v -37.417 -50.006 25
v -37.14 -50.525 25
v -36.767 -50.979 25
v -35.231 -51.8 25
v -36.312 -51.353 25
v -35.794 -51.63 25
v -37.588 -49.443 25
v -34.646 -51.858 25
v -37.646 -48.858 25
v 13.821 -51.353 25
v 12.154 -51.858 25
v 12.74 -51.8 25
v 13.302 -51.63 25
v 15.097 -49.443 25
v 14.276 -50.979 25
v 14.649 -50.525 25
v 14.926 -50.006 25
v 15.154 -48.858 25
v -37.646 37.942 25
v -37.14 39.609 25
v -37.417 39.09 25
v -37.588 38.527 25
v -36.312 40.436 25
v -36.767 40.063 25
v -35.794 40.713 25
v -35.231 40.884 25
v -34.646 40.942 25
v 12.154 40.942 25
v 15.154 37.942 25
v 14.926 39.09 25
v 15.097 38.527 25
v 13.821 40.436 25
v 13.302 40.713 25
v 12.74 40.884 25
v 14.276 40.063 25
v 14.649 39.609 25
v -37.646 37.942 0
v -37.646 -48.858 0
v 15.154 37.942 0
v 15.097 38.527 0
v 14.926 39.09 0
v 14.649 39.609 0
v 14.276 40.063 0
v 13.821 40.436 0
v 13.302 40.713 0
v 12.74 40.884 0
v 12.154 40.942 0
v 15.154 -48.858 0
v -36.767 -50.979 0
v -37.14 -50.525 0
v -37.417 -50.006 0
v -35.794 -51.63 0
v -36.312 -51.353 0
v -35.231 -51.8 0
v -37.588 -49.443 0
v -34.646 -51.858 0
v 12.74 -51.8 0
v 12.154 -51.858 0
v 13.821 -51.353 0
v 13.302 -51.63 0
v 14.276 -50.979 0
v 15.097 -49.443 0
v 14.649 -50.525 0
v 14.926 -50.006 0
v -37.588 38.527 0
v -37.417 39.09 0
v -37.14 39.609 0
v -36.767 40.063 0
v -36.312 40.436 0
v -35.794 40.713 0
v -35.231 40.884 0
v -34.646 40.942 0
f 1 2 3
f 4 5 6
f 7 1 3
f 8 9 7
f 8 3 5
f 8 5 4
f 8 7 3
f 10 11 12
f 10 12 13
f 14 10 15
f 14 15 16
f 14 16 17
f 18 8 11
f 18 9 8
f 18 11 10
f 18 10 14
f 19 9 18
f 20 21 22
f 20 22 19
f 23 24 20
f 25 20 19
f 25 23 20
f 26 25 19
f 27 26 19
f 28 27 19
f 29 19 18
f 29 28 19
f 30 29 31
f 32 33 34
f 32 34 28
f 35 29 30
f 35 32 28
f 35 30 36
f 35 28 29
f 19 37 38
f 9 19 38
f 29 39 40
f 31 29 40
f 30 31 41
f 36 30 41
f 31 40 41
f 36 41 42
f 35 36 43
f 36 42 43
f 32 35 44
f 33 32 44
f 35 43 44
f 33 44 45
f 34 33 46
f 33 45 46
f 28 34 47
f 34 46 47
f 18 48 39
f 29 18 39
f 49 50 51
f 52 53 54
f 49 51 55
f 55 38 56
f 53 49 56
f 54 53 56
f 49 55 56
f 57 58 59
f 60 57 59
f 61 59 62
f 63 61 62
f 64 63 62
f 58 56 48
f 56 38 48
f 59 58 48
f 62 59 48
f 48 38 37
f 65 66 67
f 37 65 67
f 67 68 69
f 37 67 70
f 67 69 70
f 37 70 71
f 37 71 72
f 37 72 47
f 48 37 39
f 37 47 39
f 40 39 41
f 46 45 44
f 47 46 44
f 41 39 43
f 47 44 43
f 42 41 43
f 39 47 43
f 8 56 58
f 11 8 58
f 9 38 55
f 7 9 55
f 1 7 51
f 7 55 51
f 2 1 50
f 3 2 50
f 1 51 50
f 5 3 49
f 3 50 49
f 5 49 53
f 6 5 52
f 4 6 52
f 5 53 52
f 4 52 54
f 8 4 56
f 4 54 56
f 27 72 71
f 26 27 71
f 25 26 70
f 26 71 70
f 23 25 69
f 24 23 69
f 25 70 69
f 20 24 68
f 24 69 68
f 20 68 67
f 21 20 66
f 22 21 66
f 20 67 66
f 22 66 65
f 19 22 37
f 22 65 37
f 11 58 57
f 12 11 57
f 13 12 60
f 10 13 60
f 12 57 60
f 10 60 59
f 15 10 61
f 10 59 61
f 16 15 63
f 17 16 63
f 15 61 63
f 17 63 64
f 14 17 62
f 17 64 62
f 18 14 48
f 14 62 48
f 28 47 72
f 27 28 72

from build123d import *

# Parameters (mm, degrees)
F1_DEPTH = 25


with BuildPart() as f1:
    # F0 (on Top) → F1 (new body)
    with BuildSketch(Plane.XY):
        with BuildLine():
            Line((-34.645759, -51.858142), (-11.245759, -51.858142))
            Line((-11.245759, -51.858142), (12.154241, -51.858142))
            ThreePointArc((12.154241, -51.858142), (14.275562, -50.979462), (15.154241, -48.858142))
            Line((15.154241, -48.858142), (15.154241, 37.941858))
            ThreePointArc((15.154241, 37.941858), (14.275562, 40.063178), (12.154241, 40.941858))
            Line((12.154241, 40.941858), (-34.645759, 40.941858))
            ThreePointArc((-34.645759, 40.941858), (-36.767079, 40.063178), (-37.645759, 37.941858))
            Line((-37.645759, 37.941858), (-37.645759, -48.858142))
            ThreePointArc((-37.645759, -48.858142), (-36.767079, -50.979462), (-34.645759, -51.858142))
        make_face()
    extrude(amount=F1_DEPTH)


solid = f1.part
